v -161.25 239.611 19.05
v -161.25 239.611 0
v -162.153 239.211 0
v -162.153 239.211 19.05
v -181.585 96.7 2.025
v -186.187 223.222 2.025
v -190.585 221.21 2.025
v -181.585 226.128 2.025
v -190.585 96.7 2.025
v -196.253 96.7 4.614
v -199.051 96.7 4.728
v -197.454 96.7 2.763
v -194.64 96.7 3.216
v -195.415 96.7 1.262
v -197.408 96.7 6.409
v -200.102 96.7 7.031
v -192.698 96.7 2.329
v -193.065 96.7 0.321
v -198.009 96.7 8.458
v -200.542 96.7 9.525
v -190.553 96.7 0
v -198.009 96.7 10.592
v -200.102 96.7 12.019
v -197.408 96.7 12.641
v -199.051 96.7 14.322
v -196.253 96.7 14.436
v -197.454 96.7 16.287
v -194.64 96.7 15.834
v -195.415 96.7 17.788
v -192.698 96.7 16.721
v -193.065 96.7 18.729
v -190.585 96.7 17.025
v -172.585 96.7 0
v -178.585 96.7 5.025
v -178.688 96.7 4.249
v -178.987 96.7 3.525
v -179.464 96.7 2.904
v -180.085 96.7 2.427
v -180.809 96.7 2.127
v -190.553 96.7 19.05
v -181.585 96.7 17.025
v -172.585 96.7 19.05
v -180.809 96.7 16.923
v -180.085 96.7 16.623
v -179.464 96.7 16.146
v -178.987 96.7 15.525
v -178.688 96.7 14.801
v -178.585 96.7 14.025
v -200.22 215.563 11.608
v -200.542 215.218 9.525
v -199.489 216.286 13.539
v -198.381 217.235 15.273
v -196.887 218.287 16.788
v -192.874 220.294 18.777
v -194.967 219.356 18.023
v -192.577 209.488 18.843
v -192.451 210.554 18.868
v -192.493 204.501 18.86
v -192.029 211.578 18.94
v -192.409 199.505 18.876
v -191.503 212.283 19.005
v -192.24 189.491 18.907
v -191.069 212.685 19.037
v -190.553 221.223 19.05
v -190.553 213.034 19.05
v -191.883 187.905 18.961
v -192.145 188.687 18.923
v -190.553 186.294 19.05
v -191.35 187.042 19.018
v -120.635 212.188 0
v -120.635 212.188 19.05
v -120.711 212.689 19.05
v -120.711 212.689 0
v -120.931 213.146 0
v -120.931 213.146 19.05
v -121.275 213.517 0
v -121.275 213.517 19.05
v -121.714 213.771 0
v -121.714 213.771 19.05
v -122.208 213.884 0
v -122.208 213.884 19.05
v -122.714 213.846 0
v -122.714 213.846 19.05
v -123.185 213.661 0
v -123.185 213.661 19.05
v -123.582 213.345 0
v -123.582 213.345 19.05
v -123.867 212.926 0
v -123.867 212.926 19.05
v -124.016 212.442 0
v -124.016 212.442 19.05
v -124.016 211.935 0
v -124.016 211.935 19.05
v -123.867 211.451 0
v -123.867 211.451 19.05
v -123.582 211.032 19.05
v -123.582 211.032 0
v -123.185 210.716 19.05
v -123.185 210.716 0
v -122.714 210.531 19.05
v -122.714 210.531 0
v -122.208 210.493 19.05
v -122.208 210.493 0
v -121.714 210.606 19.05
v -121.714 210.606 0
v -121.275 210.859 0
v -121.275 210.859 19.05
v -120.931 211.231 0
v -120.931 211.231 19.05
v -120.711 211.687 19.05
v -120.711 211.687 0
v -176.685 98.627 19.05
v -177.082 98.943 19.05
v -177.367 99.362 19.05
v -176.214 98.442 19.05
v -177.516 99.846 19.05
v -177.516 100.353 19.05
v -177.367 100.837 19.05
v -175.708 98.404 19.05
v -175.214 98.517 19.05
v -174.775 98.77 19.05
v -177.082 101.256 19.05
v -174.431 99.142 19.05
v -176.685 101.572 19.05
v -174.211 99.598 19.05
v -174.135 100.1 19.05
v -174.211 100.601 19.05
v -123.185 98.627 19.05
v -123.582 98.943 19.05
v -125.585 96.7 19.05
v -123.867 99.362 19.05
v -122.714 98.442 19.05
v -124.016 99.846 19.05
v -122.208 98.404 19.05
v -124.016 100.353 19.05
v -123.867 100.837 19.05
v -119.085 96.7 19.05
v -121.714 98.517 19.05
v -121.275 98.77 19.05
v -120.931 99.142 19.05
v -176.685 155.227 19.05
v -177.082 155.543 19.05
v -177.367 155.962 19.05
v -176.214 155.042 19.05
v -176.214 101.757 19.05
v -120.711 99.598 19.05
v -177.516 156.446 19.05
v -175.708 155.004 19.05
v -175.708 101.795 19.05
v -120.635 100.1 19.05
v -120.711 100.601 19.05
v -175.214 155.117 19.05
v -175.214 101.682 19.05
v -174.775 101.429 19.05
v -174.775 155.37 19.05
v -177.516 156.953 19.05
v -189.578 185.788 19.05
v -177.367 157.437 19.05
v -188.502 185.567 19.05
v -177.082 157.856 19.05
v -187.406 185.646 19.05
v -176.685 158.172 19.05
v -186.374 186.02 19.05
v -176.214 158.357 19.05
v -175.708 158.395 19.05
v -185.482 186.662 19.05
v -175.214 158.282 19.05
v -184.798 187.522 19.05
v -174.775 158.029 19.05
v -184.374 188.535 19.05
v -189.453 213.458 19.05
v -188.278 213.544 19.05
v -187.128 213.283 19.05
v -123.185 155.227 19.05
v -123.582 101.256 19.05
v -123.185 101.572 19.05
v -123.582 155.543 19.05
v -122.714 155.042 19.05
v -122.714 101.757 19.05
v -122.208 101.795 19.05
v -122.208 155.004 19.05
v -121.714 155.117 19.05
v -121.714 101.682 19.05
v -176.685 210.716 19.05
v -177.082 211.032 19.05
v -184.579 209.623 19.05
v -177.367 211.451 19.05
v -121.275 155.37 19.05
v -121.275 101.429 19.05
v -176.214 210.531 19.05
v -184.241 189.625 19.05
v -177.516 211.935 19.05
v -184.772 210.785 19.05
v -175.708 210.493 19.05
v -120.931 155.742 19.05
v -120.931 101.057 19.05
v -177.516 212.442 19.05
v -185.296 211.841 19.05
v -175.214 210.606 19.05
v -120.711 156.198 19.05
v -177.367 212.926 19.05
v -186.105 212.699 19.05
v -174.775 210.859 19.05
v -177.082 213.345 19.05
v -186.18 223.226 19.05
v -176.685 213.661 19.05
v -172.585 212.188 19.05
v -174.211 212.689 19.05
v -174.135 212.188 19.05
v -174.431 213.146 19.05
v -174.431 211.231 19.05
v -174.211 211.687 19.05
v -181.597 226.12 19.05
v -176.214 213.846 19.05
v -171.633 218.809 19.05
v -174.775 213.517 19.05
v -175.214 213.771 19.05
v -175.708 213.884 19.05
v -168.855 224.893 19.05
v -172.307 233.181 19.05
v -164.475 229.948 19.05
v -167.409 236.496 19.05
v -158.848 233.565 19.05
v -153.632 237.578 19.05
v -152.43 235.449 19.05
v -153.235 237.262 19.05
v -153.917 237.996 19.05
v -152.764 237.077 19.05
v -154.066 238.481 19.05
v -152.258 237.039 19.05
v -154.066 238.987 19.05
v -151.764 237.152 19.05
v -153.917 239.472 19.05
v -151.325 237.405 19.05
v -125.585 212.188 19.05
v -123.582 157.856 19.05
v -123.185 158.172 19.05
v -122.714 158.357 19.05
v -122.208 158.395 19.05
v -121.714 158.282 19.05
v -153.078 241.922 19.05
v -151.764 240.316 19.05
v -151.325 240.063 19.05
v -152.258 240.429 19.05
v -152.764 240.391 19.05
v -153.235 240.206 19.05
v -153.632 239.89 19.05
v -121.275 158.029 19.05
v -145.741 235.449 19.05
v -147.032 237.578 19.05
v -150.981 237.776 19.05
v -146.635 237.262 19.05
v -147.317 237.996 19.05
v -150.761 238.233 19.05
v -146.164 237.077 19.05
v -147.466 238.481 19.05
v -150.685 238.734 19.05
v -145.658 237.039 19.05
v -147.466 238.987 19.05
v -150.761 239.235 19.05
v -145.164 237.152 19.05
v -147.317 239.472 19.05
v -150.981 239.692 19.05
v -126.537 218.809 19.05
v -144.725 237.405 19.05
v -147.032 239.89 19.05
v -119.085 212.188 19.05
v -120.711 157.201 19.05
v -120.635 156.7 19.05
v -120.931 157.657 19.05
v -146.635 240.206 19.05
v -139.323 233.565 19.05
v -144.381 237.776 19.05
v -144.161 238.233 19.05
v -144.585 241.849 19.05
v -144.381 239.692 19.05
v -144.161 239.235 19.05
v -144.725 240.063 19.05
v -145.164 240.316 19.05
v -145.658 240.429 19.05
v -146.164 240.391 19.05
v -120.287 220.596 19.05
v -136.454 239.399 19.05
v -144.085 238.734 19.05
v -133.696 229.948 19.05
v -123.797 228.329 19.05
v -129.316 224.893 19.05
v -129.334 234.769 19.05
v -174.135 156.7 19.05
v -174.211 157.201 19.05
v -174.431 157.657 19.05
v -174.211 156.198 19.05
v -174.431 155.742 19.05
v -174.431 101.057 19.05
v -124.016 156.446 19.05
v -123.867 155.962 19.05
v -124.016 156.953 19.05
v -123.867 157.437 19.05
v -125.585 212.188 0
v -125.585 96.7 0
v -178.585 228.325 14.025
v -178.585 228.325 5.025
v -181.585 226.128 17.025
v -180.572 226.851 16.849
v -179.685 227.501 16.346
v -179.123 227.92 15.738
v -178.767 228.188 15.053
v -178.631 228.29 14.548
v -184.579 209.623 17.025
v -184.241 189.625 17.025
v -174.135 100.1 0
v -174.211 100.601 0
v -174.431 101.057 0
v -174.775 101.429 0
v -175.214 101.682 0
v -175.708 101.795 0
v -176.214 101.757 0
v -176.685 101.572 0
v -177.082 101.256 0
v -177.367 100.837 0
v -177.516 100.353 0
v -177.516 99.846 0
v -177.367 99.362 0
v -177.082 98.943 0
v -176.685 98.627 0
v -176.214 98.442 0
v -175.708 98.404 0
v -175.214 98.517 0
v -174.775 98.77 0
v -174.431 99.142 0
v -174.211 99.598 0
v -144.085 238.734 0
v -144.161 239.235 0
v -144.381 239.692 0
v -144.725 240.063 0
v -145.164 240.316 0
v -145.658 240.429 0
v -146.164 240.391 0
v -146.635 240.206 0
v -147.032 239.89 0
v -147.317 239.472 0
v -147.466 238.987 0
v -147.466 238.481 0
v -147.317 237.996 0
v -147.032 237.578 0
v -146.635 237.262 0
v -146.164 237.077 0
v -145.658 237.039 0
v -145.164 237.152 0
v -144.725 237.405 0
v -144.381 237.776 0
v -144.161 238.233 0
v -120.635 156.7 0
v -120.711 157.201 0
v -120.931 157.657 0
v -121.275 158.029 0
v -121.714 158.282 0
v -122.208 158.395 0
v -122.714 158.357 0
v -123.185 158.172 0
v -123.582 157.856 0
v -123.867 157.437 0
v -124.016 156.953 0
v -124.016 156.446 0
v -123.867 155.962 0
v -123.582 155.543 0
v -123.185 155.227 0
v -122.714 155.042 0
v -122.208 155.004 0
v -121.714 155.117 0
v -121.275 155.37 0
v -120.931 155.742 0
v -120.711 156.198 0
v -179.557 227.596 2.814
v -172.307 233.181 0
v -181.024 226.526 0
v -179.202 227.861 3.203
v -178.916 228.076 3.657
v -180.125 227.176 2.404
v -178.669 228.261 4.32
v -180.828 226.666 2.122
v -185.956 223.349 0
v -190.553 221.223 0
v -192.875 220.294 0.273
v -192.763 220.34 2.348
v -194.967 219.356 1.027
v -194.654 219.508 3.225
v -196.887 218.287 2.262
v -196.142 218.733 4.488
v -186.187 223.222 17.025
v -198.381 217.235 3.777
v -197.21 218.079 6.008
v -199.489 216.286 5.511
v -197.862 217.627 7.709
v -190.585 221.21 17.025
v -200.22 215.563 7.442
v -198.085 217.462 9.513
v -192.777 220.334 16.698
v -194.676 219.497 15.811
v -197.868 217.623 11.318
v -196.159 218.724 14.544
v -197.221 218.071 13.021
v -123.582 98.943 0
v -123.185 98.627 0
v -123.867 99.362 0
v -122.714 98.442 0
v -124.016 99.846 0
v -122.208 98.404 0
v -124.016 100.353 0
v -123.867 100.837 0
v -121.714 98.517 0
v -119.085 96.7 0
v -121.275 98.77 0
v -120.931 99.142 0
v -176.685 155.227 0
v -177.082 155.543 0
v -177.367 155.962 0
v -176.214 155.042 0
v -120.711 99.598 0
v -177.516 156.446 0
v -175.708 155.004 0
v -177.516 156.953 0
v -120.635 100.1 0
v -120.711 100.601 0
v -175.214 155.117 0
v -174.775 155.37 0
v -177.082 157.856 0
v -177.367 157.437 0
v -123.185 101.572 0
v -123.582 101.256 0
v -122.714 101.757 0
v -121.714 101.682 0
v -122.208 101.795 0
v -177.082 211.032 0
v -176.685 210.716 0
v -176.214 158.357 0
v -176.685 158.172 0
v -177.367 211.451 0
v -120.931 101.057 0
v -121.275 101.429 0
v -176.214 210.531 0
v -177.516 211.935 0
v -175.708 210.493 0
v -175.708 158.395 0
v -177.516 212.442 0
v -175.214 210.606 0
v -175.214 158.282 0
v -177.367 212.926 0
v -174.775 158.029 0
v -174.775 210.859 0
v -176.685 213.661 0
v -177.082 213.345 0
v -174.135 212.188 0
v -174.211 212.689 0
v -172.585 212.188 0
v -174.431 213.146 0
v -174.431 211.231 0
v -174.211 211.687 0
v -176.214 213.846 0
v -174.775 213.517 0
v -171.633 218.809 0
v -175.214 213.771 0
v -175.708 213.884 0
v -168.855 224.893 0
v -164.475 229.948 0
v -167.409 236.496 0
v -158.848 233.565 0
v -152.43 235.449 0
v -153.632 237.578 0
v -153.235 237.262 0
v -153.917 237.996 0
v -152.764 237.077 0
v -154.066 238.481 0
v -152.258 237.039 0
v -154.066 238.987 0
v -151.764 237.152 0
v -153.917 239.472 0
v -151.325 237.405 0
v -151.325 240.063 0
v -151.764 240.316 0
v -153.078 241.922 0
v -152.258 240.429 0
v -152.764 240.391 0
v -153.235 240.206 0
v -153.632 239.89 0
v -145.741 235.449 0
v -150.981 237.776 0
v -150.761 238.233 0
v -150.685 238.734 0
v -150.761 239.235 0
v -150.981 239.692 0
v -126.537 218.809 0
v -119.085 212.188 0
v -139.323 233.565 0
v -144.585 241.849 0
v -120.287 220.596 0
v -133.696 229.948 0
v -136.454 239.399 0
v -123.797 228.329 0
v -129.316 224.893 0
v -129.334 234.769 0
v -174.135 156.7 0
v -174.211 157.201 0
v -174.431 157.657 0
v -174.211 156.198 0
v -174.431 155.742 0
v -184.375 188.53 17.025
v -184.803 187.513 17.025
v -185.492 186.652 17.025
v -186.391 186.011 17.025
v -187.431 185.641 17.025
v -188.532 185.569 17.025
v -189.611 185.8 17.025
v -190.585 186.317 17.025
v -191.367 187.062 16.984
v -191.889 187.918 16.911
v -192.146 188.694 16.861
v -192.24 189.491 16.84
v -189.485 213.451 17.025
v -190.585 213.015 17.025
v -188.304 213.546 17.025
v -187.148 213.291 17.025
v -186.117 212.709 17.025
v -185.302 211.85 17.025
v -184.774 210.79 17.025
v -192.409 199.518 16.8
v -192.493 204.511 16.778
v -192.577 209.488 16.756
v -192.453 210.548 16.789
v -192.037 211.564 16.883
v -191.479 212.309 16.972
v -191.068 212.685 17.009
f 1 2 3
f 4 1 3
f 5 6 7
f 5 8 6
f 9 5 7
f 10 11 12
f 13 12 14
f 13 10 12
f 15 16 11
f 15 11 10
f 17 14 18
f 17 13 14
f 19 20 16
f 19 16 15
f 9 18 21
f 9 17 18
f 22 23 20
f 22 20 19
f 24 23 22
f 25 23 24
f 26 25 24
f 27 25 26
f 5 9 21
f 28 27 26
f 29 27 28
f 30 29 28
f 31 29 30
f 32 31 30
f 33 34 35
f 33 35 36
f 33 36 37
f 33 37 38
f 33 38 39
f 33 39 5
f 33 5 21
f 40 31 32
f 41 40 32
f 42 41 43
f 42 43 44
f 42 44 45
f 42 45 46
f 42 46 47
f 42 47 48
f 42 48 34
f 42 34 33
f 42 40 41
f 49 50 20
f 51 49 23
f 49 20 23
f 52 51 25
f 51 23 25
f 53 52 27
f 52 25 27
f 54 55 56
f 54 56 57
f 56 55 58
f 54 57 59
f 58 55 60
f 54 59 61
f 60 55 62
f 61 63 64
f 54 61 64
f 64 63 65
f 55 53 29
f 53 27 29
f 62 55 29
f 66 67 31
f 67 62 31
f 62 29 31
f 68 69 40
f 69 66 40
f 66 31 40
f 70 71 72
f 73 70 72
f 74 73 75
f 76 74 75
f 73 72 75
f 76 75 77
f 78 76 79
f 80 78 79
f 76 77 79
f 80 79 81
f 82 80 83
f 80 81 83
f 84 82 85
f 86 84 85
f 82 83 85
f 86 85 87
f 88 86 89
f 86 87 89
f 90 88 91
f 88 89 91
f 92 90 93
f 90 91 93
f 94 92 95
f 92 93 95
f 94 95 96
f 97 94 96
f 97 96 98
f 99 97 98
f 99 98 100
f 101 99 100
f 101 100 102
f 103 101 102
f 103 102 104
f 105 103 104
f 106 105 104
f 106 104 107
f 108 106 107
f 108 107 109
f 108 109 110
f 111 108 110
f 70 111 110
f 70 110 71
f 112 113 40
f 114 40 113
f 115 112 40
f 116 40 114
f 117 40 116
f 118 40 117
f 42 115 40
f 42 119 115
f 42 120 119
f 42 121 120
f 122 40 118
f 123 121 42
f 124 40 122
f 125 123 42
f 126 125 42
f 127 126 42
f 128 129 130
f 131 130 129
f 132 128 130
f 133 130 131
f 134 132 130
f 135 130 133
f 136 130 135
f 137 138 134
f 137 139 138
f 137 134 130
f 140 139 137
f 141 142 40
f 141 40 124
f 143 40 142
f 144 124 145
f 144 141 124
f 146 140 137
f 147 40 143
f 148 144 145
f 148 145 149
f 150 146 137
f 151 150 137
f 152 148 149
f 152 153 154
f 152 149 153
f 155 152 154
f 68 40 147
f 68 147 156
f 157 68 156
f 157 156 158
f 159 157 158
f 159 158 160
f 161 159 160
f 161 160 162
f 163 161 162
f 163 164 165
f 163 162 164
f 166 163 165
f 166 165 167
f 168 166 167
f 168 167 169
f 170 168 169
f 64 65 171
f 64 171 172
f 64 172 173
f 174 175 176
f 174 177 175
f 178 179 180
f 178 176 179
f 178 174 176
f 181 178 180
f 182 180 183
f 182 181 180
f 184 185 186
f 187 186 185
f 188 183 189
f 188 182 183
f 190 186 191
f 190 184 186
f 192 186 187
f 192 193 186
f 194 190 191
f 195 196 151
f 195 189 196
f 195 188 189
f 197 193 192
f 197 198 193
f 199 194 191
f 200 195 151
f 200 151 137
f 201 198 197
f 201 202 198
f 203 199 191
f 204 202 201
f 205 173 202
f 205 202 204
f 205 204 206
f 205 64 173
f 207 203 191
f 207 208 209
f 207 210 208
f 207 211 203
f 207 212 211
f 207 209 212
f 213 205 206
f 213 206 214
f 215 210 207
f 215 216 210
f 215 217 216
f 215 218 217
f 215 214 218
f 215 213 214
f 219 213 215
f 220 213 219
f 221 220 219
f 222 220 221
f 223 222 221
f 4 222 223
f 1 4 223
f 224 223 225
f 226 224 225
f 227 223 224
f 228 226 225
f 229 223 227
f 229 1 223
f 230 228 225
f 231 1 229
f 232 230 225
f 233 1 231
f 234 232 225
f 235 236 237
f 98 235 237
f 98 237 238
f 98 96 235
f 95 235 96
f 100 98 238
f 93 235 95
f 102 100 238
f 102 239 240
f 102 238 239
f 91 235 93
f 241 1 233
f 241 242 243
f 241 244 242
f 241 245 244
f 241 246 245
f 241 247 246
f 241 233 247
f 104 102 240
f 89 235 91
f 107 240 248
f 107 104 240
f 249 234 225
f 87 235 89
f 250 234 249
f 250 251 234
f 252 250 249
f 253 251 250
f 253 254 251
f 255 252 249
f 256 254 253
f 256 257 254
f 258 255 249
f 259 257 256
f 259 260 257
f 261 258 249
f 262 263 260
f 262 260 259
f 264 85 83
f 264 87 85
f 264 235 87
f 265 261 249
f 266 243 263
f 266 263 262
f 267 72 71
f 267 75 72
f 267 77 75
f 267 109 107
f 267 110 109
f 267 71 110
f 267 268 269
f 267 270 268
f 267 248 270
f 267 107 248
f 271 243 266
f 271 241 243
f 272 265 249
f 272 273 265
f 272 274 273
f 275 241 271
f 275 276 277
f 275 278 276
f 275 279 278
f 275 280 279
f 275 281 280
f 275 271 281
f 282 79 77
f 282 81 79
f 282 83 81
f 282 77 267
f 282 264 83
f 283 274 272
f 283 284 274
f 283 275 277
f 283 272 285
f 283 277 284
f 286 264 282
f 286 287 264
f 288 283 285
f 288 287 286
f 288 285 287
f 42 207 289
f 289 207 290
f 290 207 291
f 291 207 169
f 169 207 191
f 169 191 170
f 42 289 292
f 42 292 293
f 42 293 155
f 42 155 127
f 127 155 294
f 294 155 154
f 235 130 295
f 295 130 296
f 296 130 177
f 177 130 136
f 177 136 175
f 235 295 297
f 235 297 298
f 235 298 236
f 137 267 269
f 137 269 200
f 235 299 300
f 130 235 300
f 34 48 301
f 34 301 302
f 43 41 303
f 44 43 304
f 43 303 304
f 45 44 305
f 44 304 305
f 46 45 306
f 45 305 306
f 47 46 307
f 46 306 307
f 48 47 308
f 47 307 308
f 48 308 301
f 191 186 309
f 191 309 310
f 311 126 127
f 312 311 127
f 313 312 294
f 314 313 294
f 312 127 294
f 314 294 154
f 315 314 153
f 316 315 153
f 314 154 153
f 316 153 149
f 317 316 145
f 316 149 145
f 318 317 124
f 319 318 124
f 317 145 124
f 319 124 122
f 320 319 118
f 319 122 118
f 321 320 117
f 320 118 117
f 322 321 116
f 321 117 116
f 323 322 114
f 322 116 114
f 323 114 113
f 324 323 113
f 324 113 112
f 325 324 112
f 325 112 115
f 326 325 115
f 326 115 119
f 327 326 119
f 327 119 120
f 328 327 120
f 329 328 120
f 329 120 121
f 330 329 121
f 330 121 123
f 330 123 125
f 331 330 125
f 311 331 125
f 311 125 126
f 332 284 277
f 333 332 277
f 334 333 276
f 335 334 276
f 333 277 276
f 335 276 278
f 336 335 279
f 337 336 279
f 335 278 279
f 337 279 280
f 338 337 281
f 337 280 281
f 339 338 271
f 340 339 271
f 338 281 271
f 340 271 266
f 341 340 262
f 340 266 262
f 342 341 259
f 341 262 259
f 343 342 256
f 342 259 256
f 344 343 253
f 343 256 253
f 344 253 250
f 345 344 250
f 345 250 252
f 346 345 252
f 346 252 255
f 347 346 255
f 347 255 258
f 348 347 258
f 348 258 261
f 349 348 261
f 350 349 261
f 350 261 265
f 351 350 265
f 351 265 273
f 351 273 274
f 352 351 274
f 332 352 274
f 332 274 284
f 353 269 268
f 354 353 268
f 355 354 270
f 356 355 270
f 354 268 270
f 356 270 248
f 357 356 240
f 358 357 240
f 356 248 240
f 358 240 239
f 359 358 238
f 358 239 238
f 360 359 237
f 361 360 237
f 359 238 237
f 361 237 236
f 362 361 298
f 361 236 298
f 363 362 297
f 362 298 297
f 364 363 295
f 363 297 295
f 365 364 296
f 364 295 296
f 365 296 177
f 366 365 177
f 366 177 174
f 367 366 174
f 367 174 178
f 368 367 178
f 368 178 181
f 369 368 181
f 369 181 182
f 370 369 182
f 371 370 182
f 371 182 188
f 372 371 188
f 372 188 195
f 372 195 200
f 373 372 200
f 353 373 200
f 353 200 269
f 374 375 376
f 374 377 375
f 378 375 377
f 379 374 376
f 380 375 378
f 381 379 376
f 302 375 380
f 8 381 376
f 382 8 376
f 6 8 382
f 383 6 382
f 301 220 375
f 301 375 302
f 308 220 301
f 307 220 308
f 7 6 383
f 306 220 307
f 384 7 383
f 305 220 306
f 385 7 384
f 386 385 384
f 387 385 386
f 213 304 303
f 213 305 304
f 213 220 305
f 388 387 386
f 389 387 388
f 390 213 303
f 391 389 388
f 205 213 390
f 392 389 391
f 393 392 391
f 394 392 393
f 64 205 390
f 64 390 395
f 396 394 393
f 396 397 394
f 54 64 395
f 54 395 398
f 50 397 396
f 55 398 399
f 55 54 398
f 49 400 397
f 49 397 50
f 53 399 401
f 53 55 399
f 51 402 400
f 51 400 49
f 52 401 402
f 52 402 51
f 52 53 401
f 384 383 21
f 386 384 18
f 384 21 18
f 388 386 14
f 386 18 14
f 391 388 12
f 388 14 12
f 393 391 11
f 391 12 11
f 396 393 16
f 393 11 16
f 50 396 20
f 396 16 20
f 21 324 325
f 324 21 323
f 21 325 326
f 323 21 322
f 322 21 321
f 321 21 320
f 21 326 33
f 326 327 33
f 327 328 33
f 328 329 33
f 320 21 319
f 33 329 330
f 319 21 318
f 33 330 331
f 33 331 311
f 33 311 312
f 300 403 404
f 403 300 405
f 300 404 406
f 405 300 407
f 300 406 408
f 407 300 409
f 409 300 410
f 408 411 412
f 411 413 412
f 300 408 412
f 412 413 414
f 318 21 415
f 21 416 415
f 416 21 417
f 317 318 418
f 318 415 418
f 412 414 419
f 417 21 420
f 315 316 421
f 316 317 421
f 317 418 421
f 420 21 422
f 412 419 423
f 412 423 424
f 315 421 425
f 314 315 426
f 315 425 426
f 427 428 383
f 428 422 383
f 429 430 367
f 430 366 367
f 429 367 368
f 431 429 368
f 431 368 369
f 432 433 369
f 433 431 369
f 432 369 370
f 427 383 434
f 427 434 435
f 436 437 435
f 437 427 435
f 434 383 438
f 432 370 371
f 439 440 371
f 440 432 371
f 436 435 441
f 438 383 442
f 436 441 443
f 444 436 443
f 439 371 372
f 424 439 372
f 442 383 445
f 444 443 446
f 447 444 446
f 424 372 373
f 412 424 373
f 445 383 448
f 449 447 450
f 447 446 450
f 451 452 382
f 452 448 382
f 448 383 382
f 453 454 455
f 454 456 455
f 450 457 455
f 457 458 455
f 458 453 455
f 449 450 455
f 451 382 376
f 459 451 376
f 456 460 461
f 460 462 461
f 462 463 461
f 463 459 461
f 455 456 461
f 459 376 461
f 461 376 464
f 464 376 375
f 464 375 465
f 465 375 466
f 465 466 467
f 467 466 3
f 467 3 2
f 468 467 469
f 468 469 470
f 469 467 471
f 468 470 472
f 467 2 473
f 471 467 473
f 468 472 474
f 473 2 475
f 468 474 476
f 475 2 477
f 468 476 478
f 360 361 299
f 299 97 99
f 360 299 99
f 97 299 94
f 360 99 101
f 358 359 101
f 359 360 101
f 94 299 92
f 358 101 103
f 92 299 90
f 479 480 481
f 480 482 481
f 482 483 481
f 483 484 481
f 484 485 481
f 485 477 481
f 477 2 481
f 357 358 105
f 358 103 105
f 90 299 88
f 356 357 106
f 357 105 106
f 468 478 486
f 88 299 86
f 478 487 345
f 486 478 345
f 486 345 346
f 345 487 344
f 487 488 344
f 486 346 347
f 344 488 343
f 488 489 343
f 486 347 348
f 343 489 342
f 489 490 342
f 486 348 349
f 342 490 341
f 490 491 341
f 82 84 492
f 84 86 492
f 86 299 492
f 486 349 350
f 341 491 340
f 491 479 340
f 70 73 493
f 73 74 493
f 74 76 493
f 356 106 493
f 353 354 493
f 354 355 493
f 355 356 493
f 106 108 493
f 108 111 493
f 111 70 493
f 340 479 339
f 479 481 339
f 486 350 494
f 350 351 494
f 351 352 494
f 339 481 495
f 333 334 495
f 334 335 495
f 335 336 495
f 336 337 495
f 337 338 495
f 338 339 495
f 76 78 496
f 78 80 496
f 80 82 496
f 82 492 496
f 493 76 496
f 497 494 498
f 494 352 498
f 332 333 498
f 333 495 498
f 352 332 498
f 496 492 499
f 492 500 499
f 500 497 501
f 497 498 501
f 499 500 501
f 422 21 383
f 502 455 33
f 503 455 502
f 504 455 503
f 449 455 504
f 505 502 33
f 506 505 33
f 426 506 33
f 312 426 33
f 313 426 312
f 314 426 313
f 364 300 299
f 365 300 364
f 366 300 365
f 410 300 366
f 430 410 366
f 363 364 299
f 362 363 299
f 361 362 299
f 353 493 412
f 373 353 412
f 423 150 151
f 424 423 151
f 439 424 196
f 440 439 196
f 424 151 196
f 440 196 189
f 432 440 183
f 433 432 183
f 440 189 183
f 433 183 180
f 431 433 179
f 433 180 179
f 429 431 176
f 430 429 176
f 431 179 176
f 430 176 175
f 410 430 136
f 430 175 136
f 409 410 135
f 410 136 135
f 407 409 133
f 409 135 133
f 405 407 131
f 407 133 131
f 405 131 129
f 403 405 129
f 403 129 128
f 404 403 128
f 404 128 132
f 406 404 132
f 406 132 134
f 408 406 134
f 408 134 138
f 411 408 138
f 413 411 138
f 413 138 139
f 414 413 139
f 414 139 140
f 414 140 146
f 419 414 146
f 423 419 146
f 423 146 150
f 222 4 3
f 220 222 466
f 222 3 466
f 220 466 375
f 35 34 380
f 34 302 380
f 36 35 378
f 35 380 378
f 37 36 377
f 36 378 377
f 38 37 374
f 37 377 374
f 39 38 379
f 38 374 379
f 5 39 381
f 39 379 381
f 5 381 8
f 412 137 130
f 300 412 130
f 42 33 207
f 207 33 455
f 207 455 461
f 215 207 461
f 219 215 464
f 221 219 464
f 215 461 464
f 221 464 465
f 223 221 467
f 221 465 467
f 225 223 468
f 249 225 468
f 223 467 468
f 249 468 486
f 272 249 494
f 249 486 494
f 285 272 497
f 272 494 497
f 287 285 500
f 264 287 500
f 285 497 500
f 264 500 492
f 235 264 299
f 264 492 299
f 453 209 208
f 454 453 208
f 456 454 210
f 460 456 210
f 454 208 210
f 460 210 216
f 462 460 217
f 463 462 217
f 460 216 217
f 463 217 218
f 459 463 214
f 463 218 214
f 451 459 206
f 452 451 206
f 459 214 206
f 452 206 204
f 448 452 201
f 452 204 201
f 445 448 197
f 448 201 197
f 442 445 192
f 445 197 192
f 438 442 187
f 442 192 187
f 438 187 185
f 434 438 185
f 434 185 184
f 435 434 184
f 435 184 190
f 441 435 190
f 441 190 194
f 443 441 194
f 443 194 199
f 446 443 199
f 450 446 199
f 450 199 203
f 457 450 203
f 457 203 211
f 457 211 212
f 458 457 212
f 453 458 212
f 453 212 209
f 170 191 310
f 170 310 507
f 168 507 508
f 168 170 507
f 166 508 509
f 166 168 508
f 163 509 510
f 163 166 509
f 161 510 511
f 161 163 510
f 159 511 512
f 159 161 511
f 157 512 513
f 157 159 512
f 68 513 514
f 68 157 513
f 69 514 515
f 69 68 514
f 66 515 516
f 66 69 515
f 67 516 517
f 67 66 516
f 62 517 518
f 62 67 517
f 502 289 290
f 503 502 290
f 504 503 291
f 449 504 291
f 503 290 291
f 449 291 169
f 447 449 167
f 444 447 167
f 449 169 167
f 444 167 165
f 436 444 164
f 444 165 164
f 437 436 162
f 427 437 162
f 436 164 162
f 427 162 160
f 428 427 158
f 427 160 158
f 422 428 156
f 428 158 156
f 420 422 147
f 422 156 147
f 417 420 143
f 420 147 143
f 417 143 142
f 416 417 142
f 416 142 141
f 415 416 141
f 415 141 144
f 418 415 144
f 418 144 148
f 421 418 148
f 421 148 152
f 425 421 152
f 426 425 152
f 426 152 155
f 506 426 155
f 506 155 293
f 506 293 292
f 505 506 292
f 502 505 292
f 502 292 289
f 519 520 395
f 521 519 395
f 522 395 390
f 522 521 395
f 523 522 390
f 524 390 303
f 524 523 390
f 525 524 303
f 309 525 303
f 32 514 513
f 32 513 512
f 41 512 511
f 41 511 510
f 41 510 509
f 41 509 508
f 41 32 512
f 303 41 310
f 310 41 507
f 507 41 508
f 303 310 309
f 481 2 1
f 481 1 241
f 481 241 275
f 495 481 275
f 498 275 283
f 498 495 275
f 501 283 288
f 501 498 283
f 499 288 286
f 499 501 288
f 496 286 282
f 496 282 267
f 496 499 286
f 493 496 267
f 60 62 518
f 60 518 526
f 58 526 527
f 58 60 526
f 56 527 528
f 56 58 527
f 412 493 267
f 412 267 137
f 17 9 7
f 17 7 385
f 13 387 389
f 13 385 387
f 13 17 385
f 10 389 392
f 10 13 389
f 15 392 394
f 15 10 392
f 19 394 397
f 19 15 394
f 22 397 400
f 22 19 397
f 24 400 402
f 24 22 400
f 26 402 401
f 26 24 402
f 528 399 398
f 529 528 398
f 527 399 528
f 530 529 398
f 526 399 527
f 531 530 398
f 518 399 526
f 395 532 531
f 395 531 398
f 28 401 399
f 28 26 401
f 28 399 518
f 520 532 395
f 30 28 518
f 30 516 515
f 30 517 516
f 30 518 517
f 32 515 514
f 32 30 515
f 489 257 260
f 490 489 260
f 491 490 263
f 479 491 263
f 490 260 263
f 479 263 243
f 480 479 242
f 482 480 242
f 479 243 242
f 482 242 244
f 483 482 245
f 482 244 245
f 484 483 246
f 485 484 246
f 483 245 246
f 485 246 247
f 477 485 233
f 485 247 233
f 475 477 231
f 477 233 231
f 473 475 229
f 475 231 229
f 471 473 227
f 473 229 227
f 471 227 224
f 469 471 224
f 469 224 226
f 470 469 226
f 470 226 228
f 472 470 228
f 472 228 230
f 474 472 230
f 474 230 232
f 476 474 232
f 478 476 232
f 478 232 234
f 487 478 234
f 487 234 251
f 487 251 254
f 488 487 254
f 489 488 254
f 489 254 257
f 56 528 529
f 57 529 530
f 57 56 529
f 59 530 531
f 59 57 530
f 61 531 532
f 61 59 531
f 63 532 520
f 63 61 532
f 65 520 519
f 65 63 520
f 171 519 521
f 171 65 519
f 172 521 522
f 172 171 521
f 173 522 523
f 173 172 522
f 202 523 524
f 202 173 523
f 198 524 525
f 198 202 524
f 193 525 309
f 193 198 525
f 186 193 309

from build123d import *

# Parameters (mm, degrees)
BOSS_EXTRUDE1_DEPTH = 19.05
SKETCH2_R           = 1.7
CUT_EXTRUDE1_DEPTH  = 302.810637772
CUT_EXTRUDE2_DEPTH  = 302.810637772
BOSS_EXTRUDE2_DEPTH = 135
BOSS_EXTRUDE3_START = -19.05
BOSS_EXTRUDE3_DEPTH = 19.05
CUT_EXTRUDE4_DEPTH  = 316.043777756
CUT_EXTRUDE5_DEPTH  = 249.524391307
CUT_EXTRUDE6_DEPTH  = 7
FILLET1_R           = 50
FILLET2_R           = 10
FILLET3_R           = 3


with BuildPart() as part:
    # Sketch1 → Boss-Extrude1 (new body)
    with BuildSketch(Plane.XY):
        with BuildLine():
            Line((-179.085368151, -18.789194183), (-179.085368151, 212.188334746))
            ThreePointArc((-179.085368151, 212.188334746), (-149.085368151, 242.188334746), (-119.085368151, 212.188334746))
            Line((-119.085368151, 212.188334746), (-119.085368151, -18.789194183))
            ThreePointArc((-119.085368151, -18.789194183), (-149.085368151, -48.789194183), (-179.085368151, -18.789194183))
        make_face()
        with BuildLine():
            Line((-172.585368151, -18.789194183), (-172.585368151, 212.188334746))
            ThreePointArc((-172.585368151, 212.188334746), (-149.085368151, 235.688334746), (-125.585368151, 212.188334746))
            Line((-125.585368151, 212.188334746), (-125.585368151, -18.789194183))
            ThreePointArc((-125.585368151, -18.789194183), (-149.085368151, -42.289194183), (-172.585368151, -18.789194183))
        make_face(mode=Mode.SUBTRACT)
    extrude(amount=BOSS_EXTRUDE1_DEPTH)

    # Sketch2 → Cut-Extrude1 (cut, through all)
    with BuildSketch(Plane.XY.offset(19.05)):
        with Locations((-145.785368151, 238.734002942)):
            Circle(SKETCH2_R)
        with Locations((-122.335368151, 212.188334746)):
            Circle(SKETCH2_R)
        with Locations((-152.485368151, -45.322239617)):
            Circle(SKETCH2_R)
        with Locations((-168.000474547, -37.70430058)):
            Circle(SKETCH2_R)
        with Locations((-175.835368151, -18.789194183)):
            Circle(SKETCH2_R)
        with Locations((-175.835368151, 212.188334746)):
            Circle(SKETCH2_R)
        with Locations((-145.685368151, -45.322239617)):
            Circle(SKETCH2_R)
        with Locations((-175.835368151, 100.099570281)):
            Circle(SKETCH2_R)
        with Locations((-175.835368151, 93.299570281)):
            Circle(SKETCH2_R)
        with Locations((-122.335368151, 100.099570281)):
            Circle(SKETCH2_R)
        with Locations((-122.335368151, 93.299570281)):
            Circle(SKETCH2_R)
        with Locations((-122.335368151, -18.789194183)):
            Circle(SKETCH2_R)
        with Locations((-130.170261754, -37.70430058)):
            Circle(SKETCH2_R)
        with Locations((-175.835368151, 156.699570281)):
            Circle(SKETCH2_R)
        with Locations((-122.335368151, 156.699570281)):
            Circle(SKETCH2_R)
        with Locations((-175.835368151, 66.699570281)):
            Circle(SKETCH2_R)
        with Locations((-122.335368151, 66.699570281)):
            Circle(SKETCH2_R)
        with Locations((-175.835368151, 36.699570281)):
            Circle(SKETCH2_R)
        with Locations((-122.335368151, 36.699570281)):
            Circle(SKETCH2_R)
        with Locations((-175.835368151, 6.699570281)):
            Circle(SKETCH2_R)
        with Locations((-122.335368151, 6.699570281)):
            Circle(SKETCH2_R)
        with Locations((-152.385368151, 238.734002942)):
            Circle(SKETCH2_R)
    extrude(amount=-CUT_EXTRUDE1_DEPTH, mode=Mode.SUBTRACT)

    # Sketch3 → Cut-Extrude2 (cut, through all)
    with BuildSketch(Plane.XY.offset(19.05)):
        Polygon((-149.085368151, 96.699570281), (-100.167336626, 96.699570281), (-100.167336626, -59.171887956), (-212.527814826, -59.171887956), (-212.527814826, 96.699570281), align=None)
    extrude(amount=-CUT_EXTRUDE2_DEPTH, mode=Mode.SUBTRACT)

    # Sketch4 → Boss-Extrude2 (add)
    with BuildSketch(Plane.XZ.offset(-96.699570281)):
        with BuildLine():
            Line((-179.085368151, 19.05), (-196.652205402, 19.05))
            ThreePointArc((-196.652205402, 19.05), (-200.585368151, 9.525), (-196.652205402, 0))
            Line((-196.652205402, 0), (-179.085368151, 0))
            Line((-179.085368151, 0), (-179.085368151, 19.05))
        make_face()
    extrude(amount=-BOSS_EXTRUDE2_DEPTH)

    # Sketch5 → Boss-Extrude3 (add)
    with BuildSketch(Plane.XY.offset(19.05).offset(BOSS_EXTRUDE3_START)):
        with BuildLine():
            Line((-179.085368151, 231.699570281), (-179.085368151, 212.188334746))
            ThreePointArc((-179.085368151, 212.188334746), (-174.234371945, 228.544605963), (-161.250194275, 239.611263206))
            Line((-161.250194275, 239.611263206), (-179.085368151, 231.699570281))
        make_face()
    extrude(amount=BOSS_EXTRUDE3_DEPTH)

    # Sketch6 → Cut-Extrude4 (cut, through all)
    with BuildSketch(Plane.XY.offset(19.05)):
        with BuildLine():
            Line((-166.948269283, 237.083594004), (-200.585368151, 237.083594004))
            Line((-200.585368151, 237.083594004), (-200.585368151, 215.169829532))
            add(Edge.make_bspline(
                [(-166.948269283, 237.083594004), (-174.08025285, 232.264666523), (-185.619403498, 221.256742546), (-196.521569709, 219.674382376), (-200.585368151, 215.169829532)],
                knots=[0, 0, 0, 0, 0.58548773, 1, 1, 1, 1], degree=3))
        make_face()
    extrude(amount=-CUT_EXTRUDE4_DEPTH, mode=Mode.SUBTRACT)

    # Sketch7 → Cut-Extrude5 (cut, through all)
    with BuildSketch(Plane.XZ.offset(-96.699570281)):
        with BuildLine():
            Line((-190.585368151, 17.025), (-178.585368151, 17.025))
            Line((-178.585368151, 17.025), (-178.585368151, 2.025))
            Line((-178.585368151, 2.025), (-190.585368151, 2.025))
            ThreePointArc((-190.585368151, 2.025), (-198.085368151, 9.525), (-190.585368151, 17.025))
        make_face()
    extrude(amount=-CUT_EXTRUDE5_DEPTH, mode=Mode.SUBTRACT)

    # Sketch8 → Cut-Extrude6 (cut)
    with BuildSketch(Plane.XY.offset(19.05)):
        with BuildLine():
            Line((-184.578582607, 209.622626451), (-184.241218911, 189.62547201))
            ThreePointArc((-184.241218911, 189.62547201), (-188.17317706, 185.558568382), (-192.240080687, 189.490526531))
            Line((-192.240080687, 189.490526531), (-192.577444383, 209.487680972))
            ThreePointArc((-192.577444383, 209.487680972), (-188.645486234, 213.554584599), (-184.578582607, 209.622626451))
        make_face()
    extrude(amount=-CUT_EXTRUDE6_DEPTH, mode=Mode.SUBTRACT)

    # Fillet1
    fillet1_edges = [part.edges().sort_by_distance(p)[0] for p in [
        (-166.948269283, 237.083594004, 9.525),
    ]]
    fillet(fillet1_edges, radius=FILLET1_R)

    # Fillet2
    # the kernel refuses this fillet: 10 mm, written as the material it takes off along each edge
    with BuildSketch(Plane(origin=(-196.652205402, 66.752998532, 0), x_dir=(1, 0, 0), z_dir=(0, 1, 0))) as fillet2_piece_1:
        with BuildLine():
            CenterArc((6.099219193, -10), FILLET2_R, 90, 97.799925588)
            ThreePointArc((-3.808260974, -11.357142857), (-3.23274377, -5.233062714), (0, 0))
            Line((0, 0), (6.099219193, 0))
        make_face()
    extrude(amount=181.626081549, mode=Mode.SUBTRACT)
    with BuildSketch(Plane(origin=(-196.652205402, 66.752998532, 19.05), x_dir=(-0.3179212804444137, 0, -0.9481171127242586), z_dir=(0, 1, 0))) as fillet2_piece_2:
        with BuildLine():
            CenterArc((7.542099552, -8.961986896), FILLET2_R, 63.66281519, 97.799925588)
            Line((-1.939071576, -5.782774091), (0, 0))
            ThreePointArc((0, 0), (5.98931435, 1.401317691), (11.9786287, 0))
        make_face()
    extrude(amount=181.626081549, mode=Mode.SUBTRACT)

    # Fillet3
    fillet3_edges = [part.edges().sort_by_distance(p)[0] for p in [
        (-178.585368151, 162.512316203, 17.025),
        (-178.585368151, 162.512316203, 2.025),
    ]]
    fillet(fillet3_edges, radius=FILLET3_R)


solid = part.part
